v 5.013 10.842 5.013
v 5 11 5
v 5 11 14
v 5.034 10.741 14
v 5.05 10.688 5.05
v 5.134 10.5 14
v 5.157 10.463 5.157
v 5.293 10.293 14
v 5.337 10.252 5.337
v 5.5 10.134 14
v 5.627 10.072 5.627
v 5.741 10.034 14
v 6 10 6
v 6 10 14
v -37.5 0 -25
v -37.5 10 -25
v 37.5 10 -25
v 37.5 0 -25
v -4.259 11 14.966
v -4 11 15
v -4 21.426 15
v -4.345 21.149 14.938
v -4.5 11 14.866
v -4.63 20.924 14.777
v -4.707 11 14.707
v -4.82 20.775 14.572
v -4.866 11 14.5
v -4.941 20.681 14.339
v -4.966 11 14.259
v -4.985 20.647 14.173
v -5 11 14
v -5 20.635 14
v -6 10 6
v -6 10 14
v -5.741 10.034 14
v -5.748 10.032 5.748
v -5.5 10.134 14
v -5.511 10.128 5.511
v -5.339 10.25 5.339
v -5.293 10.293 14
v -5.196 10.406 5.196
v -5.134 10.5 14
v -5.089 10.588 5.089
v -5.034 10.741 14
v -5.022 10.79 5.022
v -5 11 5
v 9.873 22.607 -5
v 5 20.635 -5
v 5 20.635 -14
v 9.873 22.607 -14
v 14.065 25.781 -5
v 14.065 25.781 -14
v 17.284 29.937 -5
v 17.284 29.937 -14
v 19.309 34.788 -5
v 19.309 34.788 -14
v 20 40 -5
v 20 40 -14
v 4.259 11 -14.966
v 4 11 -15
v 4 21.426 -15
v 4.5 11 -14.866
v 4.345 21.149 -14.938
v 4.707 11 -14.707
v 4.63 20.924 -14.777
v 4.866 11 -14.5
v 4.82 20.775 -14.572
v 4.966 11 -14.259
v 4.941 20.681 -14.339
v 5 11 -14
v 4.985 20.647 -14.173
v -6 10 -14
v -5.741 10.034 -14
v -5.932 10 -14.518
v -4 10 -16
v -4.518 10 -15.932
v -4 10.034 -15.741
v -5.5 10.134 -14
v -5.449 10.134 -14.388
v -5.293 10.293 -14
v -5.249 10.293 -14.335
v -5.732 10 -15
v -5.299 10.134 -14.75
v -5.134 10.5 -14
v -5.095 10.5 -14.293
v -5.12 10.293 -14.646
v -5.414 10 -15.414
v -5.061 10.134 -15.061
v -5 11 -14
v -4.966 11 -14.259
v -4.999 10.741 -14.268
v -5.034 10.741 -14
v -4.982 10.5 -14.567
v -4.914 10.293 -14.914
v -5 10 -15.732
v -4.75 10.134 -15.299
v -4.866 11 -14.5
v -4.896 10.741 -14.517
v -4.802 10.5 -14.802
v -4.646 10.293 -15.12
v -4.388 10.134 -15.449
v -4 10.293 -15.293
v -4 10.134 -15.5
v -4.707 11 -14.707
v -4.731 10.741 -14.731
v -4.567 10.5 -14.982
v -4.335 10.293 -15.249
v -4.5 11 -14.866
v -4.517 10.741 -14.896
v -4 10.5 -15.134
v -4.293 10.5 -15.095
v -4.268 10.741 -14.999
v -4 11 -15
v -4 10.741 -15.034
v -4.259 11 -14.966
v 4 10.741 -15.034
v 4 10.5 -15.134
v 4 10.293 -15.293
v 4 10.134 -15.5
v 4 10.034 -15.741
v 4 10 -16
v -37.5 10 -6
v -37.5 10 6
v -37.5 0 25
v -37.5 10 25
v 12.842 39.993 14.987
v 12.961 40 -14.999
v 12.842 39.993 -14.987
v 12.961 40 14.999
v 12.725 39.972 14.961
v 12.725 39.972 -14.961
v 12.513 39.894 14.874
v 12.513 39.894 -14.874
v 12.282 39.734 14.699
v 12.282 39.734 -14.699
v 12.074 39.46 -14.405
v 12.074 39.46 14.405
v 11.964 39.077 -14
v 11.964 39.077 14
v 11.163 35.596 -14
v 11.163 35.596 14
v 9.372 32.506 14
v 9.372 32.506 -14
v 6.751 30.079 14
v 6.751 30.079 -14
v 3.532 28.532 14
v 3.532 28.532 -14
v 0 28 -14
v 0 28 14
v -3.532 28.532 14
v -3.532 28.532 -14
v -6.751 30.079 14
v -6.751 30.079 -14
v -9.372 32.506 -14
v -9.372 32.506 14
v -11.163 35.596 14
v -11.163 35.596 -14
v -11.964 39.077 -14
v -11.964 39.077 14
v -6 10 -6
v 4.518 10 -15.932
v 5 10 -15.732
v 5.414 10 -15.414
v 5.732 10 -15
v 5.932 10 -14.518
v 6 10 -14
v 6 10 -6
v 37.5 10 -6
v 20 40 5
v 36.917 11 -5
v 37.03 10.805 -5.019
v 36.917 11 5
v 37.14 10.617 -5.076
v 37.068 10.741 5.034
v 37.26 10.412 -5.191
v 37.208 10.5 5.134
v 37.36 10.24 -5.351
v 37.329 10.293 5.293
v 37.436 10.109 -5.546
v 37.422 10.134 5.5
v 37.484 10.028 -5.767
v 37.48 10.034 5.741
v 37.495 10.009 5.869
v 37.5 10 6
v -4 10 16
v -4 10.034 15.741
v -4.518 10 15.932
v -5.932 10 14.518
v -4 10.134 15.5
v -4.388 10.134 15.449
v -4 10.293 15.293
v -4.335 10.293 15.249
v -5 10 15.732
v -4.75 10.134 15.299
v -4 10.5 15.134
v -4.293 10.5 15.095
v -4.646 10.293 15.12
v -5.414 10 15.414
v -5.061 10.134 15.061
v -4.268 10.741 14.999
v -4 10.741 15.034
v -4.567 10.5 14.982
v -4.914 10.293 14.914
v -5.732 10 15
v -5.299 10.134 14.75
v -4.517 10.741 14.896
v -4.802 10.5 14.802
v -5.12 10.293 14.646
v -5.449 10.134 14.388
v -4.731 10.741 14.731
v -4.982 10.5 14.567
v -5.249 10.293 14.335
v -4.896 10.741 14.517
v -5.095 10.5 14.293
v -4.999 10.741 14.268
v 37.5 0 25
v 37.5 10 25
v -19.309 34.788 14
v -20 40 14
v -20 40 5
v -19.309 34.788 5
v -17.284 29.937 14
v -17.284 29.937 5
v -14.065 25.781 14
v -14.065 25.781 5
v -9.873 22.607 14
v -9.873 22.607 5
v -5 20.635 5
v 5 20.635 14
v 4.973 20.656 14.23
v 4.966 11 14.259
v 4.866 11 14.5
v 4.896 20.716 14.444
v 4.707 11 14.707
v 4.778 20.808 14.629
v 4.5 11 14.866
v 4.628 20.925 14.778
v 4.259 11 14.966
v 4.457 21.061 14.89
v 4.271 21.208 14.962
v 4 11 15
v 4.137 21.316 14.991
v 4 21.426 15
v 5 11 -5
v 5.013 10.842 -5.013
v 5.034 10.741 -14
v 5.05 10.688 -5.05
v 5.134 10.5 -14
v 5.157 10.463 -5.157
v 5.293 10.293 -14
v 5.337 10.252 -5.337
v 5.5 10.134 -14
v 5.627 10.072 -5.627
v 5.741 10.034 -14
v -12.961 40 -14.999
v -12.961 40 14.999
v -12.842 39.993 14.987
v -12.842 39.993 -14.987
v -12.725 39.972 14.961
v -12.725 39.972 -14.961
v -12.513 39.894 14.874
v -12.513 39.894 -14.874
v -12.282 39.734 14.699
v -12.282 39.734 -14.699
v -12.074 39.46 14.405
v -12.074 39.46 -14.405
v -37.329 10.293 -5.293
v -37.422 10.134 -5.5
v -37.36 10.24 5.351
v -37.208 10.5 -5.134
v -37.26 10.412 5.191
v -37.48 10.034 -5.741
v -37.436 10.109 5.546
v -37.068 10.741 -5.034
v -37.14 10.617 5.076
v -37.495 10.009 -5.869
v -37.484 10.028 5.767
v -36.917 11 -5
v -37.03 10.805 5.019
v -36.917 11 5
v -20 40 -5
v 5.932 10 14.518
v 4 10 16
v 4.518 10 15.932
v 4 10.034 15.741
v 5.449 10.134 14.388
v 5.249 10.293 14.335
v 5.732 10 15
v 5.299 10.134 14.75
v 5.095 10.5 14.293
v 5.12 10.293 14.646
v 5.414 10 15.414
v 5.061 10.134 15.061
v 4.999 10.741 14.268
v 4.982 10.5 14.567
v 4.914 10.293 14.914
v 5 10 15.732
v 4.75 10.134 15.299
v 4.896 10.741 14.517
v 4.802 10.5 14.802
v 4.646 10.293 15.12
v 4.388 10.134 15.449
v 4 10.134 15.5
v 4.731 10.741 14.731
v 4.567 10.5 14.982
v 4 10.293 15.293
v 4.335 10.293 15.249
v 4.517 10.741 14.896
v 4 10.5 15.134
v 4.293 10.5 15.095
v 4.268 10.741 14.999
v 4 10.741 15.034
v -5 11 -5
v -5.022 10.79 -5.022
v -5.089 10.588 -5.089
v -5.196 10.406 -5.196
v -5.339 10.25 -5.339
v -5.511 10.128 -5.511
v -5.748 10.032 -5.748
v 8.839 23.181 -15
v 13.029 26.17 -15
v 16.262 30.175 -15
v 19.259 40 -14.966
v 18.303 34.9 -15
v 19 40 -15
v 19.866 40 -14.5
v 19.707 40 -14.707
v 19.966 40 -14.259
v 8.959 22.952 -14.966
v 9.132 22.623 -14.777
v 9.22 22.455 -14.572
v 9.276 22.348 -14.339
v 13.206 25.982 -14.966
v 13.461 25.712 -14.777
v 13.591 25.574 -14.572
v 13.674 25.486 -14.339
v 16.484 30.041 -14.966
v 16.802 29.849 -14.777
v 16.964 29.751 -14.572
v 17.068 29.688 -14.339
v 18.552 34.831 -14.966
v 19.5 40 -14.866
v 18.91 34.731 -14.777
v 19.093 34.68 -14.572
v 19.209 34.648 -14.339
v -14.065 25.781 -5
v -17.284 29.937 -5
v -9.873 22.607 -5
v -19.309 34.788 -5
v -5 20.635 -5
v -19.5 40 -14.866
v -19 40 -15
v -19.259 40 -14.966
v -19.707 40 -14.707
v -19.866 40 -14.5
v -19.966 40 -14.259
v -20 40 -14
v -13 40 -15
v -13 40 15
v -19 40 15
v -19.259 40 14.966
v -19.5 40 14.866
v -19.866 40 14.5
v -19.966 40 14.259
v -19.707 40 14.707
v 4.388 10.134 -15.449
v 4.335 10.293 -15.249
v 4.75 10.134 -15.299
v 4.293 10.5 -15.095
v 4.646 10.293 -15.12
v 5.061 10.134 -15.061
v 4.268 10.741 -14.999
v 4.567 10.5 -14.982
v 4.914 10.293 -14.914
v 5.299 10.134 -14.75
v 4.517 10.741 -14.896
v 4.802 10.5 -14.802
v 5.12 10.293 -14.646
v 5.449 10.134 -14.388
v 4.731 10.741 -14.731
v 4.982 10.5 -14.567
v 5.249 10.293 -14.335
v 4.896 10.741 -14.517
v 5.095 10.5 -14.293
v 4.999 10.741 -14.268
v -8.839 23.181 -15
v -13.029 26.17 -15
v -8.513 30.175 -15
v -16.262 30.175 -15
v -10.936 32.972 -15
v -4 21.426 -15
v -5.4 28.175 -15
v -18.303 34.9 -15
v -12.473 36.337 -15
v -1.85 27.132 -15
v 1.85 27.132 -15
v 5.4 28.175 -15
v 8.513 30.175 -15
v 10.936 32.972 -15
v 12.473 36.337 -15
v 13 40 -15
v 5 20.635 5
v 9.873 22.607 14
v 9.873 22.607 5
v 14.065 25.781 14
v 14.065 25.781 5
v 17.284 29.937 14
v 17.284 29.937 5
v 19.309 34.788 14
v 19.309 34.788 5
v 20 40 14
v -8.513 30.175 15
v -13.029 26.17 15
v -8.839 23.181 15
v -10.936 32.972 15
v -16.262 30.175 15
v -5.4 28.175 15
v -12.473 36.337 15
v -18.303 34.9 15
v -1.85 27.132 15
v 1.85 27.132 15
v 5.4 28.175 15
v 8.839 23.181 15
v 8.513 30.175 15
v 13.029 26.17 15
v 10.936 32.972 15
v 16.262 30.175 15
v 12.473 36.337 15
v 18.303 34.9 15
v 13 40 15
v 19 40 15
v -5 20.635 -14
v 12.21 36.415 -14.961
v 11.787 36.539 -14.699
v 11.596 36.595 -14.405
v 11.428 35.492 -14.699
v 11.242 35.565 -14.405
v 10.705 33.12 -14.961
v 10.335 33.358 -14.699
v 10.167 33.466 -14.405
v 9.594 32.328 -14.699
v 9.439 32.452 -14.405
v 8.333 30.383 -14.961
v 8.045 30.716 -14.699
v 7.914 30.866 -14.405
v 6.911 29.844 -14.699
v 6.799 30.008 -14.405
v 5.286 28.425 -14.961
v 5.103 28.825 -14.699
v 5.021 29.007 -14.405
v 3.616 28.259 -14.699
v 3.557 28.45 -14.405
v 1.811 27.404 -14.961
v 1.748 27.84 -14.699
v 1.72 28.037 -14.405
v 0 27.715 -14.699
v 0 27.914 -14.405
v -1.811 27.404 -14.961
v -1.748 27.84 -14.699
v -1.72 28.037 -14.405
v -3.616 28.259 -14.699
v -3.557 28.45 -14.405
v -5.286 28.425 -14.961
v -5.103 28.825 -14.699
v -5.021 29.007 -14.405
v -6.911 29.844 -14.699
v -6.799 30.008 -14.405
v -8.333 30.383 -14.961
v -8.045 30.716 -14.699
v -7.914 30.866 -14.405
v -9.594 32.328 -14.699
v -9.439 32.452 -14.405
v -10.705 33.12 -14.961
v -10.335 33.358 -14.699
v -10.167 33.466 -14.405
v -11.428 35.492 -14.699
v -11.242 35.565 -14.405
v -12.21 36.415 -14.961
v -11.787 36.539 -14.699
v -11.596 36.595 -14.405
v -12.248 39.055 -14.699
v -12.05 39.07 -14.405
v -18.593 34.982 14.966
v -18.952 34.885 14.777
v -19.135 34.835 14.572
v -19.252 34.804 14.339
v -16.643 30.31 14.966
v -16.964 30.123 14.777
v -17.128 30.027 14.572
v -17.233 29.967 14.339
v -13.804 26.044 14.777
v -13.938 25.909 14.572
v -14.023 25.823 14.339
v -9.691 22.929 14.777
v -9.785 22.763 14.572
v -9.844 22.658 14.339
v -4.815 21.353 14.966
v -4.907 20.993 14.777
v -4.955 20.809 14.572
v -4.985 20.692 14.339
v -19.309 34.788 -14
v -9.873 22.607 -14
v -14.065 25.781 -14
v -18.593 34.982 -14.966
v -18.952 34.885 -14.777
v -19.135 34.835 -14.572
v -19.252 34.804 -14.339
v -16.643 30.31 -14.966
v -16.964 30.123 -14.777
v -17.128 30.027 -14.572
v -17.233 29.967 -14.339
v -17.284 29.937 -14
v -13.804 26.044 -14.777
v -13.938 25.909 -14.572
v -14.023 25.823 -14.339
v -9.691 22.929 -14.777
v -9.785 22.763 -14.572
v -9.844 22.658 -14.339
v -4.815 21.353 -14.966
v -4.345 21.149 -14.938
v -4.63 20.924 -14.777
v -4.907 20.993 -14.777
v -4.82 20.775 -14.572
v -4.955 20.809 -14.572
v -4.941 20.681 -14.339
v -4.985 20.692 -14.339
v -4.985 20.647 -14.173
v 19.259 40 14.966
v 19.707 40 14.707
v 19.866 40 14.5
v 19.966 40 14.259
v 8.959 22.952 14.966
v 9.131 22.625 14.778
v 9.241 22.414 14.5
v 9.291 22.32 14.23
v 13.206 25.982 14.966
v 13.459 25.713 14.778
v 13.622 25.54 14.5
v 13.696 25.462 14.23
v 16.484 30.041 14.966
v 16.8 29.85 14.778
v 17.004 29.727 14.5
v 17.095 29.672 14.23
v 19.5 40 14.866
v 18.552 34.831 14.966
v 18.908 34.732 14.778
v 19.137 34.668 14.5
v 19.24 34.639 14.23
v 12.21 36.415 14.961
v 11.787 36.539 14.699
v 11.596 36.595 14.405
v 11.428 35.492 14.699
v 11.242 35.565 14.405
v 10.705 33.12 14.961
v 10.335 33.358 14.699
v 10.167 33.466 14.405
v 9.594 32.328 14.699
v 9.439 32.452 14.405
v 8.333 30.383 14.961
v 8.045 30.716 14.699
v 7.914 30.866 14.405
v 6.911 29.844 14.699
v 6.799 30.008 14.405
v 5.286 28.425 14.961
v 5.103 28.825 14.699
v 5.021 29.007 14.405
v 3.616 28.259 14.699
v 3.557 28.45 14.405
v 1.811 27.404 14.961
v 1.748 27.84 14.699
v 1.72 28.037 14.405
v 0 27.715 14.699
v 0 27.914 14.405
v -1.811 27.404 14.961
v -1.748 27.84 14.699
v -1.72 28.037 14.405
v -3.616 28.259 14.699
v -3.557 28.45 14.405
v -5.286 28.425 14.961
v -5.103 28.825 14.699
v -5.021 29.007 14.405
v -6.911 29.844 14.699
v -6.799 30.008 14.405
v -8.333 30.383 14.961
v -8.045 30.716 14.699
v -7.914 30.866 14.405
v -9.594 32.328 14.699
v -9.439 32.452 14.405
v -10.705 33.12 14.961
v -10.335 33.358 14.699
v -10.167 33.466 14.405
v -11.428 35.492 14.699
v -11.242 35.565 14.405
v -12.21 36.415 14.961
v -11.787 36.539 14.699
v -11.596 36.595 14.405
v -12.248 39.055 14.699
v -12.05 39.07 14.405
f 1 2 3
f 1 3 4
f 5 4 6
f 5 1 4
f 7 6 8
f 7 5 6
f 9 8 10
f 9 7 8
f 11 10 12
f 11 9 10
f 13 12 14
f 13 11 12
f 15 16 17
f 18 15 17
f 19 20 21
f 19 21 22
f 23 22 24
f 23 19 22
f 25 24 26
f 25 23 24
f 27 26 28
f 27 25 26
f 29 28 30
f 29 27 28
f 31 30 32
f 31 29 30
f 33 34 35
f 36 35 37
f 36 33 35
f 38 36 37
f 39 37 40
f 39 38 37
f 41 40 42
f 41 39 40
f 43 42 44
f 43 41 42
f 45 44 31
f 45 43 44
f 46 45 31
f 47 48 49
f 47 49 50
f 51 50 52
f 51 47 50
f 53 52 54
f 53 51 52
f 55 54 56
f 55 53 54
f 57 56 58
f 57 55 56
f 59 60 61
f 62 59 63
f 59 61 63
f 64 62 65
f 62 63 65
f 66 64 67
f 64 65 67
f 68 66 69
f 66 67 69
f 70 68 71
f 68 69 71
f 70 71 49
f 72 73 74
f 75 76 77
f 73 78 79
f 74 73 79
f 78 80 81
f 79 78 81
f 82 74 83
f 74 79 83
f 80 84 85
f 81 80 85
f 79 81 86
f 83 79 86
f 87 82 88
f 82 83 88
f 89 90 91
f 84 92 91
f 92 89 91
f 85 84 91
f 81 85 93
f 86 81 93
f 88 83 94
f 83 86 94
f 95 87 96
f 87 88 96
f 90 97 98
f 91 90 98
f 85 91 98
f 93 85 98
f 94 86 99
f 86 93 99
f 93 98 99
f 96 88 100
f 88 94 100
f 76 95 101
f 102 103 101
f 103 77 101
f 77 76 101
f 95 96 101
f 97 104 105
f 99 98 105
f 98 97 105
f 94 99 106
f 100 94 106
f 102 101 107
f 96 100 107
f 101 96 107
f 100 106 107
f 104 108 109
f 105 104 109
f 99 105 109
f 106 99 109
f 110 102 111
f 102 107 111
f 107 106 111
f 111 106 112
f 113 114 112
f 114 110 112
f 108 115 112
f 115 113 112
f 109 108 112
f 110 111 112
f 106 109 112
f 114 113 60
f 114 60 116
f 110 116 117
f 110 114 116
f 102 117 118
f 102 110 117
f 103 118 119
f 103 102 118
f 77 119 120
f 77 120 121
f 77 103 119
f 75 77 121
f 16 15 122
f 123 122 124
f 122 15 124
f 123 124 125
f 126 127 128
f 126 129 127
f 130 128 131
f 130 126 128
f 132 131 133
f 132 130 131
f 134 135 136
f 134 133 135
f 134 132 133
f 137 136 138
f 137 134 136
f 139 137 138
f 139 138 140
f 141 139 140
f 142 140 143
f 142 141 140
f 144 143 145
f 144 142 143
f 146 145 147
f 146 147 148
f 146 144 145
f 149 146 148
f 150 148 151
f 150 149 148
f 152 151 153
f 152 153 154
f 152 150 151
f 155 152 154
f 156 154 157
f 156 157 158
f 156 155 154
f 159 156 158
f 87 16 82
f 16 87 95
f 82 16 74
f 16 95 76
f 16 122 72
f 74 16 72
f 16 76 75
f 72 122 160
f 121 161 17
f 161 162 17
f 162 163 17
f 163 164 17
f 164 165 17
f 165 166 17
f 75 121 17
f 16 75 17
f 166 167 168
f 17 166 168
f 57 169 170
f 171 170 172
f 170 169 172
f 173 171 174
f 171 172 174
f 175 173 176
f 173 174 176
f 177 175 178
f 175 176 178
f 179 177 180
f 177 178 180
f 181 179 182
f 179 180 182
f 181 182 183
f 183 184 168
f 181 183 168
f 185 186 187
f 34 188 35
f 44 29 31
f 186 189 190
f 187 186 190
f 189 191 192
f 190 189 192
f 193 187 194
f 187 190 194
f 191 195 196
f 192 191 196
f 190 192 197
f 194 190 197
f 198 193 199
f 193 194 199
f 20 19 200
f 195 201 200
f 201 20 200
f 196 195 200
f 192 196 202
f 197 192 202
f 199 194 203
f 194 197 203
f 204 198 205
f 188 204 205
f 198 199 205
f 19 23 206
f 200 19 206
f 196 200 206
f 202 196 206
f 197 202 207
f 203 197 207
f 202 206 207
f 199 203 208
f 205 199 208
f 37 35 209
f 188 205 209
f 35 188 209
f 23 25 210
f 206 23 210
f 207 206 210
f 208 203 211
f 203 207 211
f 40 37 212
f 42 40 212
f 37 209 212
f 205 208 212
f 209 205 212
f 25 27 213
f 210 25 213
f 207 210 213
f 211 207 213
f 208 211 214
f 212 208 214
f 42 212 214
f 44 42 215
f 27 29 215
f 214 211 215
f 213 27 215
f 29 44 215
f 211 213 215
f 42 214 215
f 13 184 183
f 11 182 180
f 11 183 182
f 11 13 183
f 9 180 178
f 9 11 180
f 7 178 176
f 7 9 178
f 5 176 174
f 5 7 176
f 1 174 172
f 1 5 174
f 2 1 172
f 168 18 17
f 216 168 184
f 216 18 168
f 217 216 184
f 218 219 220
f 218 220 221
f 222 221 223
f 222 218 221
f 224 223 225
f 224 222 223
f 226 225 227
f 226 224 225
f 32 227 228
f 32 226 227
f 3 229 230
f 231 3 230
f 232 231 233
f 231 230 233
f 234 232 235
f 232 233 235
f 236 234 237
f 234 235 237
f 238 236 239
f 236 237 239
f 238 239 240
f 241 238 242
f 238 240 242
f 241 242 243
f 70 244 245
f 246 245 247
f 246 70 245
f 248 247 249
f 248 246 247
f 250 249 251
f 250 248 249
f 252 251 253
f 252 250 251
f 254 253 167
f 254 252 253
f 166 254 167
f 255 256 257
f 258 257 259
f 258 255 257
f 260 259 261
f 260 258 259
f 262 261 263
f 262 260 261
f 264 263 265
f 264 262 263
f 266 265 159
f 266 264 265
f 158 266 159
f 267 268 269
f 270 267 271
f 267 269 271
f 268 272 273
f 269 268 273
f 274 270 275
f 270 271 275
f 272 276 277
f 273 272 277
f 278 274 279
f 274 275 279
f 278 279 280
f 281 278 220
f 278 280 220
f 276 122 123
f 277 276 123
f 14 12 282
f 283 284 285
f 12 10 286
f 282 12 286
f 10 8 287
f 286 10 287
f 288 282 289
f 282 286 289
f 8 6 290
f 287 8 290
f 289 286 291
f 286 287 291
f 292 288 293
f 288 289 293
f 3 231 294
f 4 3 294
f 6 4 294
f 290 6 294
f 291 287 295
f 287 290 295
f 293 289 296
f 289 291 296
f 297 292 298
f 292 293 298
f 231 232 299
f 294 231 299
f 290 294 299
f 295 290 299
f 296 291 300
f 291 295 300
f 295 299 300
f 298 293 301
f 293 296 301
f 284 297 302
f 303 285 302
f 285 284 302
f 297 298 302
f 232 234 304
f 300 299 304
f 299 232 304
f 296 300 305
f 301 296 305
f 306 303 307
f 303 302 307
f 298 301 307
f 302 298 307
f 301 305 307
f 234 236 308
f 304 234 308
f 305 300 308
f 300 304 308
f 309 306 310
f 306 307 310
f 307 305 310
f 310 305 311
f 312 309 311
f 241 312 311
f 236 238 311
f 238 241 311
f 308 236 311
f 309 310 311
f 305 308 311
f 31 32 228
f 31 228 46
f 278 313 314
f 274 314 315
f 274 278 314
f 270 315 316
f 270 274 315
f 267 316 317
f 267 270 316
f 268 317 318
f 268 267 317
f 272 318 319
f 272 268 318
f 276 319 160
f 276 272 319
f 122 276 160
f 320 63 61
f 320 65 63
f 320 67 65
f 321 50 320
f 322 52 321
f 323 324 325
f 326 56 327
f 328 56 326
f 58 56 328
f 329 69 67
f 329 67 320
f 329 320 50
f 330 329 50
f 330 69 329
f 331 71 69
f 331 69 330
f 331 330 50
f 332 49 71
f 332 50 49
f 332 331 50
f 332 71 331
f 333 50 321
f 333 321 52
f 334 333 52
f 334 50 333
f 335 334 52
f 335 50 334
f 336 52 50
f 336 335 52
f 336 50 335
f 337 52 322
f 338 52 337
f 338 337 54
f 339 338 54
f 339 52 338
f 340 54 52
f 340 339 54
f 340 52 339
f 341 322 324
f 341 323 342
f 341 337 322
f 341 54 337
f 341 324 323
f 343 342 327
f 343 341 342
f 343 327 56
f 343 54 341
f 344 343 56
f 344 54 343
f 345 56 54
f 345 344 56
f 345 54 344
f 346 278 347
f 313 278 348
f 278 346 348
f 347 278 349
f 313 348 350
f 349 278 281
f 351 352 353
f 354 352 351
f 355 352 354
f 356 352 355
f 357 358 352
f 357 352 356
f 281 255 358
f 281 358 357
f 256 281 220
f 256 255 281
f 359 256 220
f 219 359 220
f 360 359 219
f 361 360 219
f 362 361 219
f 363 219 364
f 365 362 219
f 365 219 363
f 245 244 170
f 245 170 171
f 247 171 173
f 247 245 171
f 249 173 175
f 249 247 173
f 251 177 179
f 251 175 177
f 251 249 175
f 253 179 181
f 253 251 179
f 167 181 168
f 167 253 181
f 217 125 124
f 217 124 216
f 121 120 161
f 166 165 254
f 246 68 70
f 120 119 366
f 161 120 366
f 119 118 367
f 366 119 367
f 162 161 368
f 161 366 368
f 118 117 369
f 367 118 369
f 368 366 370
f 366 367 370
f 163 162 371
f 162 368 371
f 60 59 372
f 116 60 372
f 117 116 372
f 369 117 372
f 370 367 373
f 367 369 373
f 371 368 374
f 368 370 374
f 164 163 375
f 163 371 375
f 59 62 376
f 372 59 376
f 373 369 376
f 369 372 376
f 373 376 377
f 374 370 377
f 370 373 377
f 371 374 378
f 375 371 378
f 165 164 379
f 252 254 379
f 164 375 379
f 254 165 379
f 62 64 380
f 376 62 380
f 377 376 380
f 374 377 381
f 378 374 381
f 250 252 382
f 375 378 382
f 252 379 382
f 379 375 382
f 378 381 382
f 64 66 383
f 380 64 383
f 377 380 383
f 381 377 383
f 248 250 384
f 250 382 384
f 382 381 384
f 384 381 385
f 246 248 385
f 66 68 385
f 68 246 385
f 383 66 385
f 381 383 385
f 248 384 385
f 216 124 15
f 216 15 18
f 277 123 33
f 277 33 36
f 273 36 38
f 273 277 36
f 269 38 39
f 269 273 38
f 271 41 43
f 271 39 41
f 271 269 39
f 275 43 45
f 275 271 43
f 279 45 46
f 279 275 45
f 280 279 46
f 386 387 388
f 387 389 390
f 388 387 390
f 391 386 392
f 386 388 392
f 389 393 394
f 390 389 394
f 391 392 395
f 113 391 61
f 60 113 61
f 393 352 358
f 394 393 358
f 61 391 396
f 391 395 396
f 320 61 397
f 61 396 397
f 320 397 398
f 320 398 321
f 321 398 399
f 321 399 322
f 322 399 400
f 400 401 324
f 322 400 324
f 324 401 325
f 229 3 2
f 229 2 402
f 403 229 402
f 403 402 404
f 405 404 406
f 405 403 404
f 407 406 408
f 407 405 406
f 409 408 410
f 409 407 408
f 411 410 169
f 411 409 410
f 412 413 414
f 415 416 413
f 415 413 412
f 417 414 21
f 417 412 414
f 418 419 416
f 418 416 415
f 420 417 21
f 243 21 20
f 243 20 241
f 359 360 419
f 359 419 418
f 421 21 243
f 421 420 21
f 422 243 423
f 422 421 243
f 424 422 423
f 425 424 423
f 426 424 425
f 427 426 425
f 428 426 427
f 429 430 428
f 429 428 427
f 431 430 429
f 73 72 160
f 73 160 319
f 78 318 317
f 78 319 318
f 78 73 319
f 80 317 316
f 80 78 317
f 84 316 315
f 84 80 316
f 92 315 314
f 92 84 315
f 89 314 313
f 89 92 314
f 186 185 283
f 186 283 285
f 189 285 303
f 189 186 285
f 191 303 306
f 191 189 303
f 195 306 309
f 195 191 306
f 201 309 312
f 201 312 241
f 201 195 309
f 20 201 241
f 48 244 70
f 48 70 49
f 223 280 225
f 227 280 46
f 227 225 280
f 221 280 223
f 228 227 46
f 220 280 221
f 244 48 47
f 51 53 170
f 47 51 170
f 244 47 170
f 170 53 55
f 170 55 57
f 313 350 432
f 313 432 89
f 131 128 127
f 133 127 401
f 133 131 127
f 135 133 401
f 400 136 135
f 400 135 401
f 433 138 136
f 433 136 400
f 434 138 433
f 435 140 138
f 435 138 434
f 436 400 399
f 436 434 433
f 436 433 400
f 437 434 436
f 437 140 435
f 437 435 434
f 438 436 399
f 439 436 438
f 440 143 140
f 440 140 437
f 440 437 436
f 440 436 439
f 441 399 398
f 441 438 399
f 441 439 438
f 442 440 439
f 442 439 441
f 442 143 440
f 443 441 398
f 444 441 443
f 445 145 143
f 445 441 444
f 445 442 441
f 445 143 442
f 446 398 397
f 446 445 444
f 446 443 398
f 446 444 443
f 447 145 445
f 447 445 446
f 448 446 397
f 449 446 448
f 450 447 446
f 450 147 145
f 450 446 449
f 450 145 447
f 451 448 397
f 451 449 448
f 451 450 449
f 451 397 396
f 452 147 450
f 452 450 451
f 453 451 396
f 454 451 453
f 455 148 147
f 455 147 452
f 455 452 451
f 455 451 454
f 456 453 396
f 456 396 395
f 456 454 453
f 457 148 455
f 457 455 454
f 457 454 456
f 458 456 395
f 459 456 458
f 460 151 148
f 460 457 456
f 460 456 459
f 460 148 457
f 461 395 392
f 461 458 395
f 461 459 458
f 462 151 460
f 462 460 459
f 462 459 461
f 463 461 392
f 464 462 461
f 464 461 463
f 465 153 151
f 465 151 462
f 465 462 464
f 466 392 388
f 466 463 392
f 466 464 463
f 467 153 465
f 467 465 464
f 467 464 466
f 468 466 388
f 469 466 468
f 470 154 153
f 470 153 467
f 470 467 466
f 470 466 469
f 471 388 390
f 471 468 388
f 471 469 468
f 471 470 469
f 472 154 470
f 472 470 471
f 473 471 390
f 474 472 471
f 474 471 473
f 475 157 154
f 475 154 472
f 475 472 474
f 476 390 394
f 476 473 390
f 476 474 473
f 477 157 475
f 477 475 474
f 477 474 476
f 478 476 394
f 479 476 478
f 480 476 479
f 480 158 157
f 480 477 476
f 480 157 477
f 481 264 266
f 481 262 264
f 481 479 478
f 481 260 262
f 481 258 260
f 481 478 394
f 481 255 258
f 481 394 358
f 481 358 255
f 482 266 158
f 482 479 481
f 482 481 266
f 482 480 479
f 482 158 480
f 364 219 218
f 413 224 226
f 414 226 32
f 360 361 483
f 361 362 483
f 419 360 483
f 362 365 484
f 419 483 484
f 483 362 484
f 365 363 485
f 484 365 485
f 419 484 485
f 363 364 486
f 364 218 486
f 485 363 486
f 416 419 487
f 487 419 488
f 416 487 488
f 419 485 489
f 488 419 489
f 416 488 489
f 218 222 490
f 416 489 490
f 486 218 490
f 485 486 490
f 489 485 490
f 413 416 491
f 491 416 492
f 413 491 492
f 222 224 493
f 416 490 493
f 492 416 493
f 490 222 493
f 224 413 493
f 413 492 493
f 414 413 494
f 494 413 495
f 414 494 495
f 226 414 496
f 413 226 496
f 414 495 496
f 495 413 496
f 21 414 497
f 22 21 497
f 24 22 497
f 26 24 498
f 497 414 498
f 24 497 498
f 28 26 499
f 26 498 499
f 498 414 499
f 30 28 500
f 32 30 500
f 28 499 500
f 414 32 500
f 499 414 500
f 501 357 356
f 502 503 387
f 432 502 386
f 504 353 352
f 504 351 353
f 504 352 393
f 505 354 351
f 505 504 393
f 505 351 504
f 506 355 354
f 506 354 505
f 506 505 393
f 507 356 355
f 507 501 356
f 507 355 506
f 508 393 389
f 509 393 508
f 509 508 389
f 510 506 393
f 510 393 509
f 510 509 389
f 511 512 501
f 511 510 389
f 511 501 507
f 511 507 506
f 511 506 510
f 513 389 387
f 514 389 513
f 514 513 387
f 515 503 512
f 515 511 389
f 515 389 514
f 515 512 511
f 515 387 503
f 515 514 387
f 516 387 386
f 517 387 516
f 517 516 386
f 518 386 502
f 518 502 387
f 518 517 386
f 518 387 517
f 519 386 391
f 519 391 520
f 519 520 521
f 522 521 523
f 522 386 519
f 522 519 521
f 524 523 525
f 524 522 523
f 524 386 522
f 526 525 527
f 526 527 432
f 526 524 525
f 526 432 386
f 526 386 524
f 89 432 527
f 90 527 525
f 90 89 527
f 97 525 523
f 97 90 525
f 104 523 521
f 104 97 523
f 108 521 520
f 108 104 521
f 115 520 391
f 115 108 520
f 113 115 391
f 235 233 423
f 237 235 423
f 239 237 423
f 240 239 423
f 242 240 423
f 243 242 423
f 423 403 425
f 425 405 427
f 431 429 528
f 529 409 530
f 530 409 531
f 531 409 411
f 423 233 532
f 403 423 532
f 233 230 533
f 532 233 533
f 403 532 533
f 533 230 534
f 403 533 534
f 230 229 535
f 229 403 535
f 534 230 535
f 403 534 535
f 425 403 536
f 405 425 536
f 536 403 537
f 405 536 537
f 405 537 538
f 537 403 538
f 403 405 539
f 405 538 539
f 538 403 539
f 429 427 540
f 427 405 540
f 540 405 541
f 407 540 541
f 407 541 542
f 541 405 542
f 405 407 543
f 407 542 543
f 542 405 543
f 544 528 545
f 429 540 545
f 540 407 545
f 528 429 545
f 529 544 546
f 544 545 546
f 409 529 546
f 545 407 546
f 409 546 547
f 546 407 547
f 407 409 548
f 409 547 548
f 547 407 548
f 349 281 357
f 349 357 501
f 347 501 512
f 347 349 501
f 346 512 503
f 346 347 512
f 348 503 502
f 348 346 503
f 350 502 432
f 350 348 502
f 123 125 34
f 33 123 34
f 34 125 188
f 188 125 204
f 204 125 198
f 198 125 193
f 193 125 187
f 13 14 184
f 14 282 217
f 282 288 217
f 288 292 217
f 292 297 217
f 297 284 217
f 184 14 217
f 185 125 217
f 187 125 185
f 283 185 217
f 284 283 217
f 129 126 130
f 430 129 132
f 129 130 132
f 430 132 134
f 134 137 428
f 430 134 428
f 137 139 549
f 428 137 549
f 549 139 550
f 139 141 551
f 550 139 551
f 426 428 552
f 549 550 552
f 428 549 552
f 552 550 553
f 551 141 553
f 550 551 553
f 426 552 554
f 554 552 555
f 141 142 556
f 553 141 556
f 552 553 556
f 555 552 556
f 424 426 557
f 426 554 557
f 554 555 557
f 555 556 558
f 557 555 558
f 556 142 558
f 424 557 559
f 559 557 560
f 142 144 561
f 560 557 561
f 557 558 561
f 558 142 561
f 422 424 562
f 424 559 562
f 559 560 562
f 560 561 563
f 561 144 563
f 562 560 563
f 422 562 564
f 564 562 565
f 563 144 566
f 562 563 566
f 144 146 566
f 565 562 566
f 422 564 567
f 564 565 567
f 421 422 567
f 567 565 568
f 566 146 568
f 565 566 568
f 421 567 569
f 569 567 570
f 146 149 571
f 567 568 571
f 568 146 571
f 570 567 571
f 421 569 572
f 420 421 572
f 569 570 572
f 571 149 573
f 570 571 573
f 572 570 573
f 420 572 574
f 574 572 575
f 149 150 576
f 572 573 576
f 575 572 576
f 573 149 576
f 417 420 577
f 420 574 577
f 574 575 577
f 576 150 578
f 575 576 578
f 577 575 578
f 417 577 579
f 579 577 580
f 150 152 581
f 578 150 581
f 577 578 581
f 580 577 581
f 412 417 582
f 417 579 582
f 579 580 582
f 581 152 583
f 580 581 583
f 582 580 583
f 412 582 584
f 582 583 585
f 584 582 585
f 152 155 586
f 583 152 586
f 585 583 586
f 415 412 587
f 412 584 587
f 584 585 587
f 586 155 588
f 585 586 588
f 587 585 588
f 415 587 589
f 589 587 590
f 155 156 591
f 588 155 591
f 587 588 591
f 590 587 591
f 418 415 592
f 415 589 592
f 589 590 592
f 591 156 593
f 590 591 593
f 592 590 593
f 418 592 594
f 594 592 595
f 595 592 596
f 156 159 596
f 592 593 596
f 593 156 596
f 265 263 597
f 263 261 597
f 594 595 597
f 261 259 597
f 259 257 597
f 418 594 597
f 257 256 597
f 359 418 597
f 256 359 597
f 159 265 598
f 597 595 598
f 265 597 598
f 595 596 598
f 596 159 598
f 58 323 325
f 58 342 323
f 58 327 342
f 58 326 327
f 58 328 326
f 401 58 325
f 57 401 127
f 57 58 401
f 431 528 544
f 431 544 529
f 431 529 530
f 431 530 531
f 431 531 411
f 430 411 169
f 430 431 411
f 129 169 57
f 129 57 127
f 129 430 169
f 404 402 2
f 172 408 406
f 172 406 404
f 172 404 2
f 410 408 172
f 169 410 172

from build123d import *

# Parameters (mm, degrees)
SKETCH1_W           = 75
SKETCH1_H           = 10
BOSS_EXTRUDE5_DEPTH = 25
BOSS_EXTRUDE6_DEPTH = 15
BOSS_EXTRUDE7_DEPTH = 5
FILLET2_R           = 1
FILLET3_R           = 1


with BuildPart() as part:
    # Sketch1 → Boss-Extrude5 (new, symmetric)
    with BuildSketch(Plane.XY):
        with Locations((0, 5)):
            Rectangle(SKETCH1_W, SKETCH1_H)
    extrude(amount=BOSS_EXTRUDE5_DEPTH, both=True)

    # Sketch1<9> → Boss-Extrude6 (add, symmetric)
    with BuildSketch(Plane.XY):
        with BuildLine():
            Line((-5, 20.635083269), (-5, 10))
            Line((-5, 10), (5, 10))
            Line((5, 10), (5, 20.635083269))
            ThreePointArc((5, 20.635083269), (15.811388301, 27.752551286), (20, 40))
            Line((20, 40), (12, 40))
            ThreePointArc((12, 40), (0, 28), (-12, 40))
            Line((-12, 40), (-20, 40))
            ThreePointArc((-20, 40), (-15.811388301, 27.752551286), (-5, 20.635083269))
        make_face()
    extrude(amount=BOSS_EXTRUDE6_DEPTH, both=True)

    # Sketch1<10> → Boss-Extrude7 (add, symmetric)
    with BuildSketch(Plane.XY):
        with BuildLine():
            Line((5, 10), (37.5, 10))
            Line((37.5, 10), (20, 40))
            ThreePointArc((20, 40), (15.811388301, 27.752551286), (5, 20.635083269))
            Line((5, 20.635083269), (5, 10))
        make_face()
        with BuildLine():
            Line((-20, 40), (-37.5, 10))
            Line((-37.5, 10), (-5, 10))
            Line((-5, 10), (-5, 20.635083269))
            ThreePointArc((-5, 20.635083269), (-15.811388301, 27.752551286), (-20, 40))
        make_face()
    extrude(amount=BOSS_EXTRUDE7_DEPTH, both=True)

    # Fillet2
    fillet2_edges = [part.edges().sort_by_distance(p)[0] for p in [
        (-12, 40, 0),
        (-15.811388301, 27.752551286, -15),
        (-5, 15.317541634, -15),
        (5, 15.317541634, 15),
        (15.811388301, 27.752551286, -15),
        (0, 28, 15),
        (12, 40, 0),
        (-15.811388301, 27.752551286, 15),
        (-5, 15.317541634, 15),
        (15.811388301, 27.752551286, 15),
        (0, 28, -15),
        (5, 15.317541634, -15),
    ]]
    fillet(fillet2_edges, radius=FILLET2_R)

    # Fillet3
    # the kernel refuses this fillet: 1 mm, written as the material it adds along each edge
    with BuildSketch(Plane(origin=(5, 10, -14), x_dir=(1, 0, 0), z_dir=(0, 0, 1)), Plane(origin=(5, 10, 2.5), x_dir=(1, 0, 0), z_dir=(0, 0, 1))) as fillet3_piece_1:
        with BuildLine():
            CenterArc((FILLET3_R, FILLET3_R), FILLET3_R, 180, 90)
            Line((0, FILLET3_R), (0, 0))
            Line((0, 0), (FILLET3_R, 0))
        make_face()
    extrude(amount=11.5)
    with BuildSketch(Plane(origin=(-5, 10, -14), x_dir=(-1, 0, 0), z_dir=(0, 0, 1)), Plane(origin=(-5, 10, 2.5), x_dir=(-1, 0, 0), z_dir=(0, 0, 1))) as fillet3_piece_2:
        with BuildLine():
            CenterArc((FILLET3_R, -FILLET3_R), FILLET3_R, 90, 90)
            Line((0, -FILLET3_R), (0, 0))
            Line((0, 0), (FILLET3_R, 0))
        make_face()
    extrude(amount=11.5)
    with BuildSketch(Plane(origin=(2.5, 10, 5), x_dir=(0, 0, 1), z_dir=(1, 0, 0))) as fillet3_piece_3_section:
        with BuildLine():
            CenterArc((FILLET3_R, -FILLET3_R), FILLET3_R, 90, 90)
            Line((0, -FILLET3_R), (0, 0))
            Line((0, 0), (FILLET3_R, 0))
        make_face()
    fillet3_piece_3 = extrude(amount=35, mode=Mode.PRIVATE)
    fillet3_piece_3 = split(fillet3_piece_3, bisect_by=Plane(origin=(28.832812489, 24.858035733, 5.226395114), z_dir=(-0.8637789008984333, -0.5038710255240864, 0)), keep=Keep.TOP, mode=Mode.PRIVATE)
    add(fillet3_piece_3)
    with BuildSketch(Plane(origin=(2.5, 10, -5), x_dir=(0, 0, -1), z_dir=(1, 0, 0))) as fillet3_piece_4_section:
        with BuildLine():
            CenterArc((FILLET3_R, FILLET3_R), FILLET3_R, 180, 90)
            Line((0, FILLET3_R), (0, 0))
            Line((0, 0), (FILLET3_R, 0))
        make_face()
    fillet3_piece_4 = extrude(amount=35, mode=Mode.PRIVATE)
    fillet3_piece_4 = split(fillet3_piece_4, bisect_by=Plane(origin=(28.832812489, 24.858035733, -5.226395114), z_dir=(-0.8637789008984333, -0.5038710255240864, 0)), keep=Keep.TOP, mode=Mode.PRIVATE)
    add(fillet3_piece_4)
    with BuildSketch(Plane(origin=(-37.5, 10, 5), x_dir=(0, 0, 1), z_dir=(1, 0, 0))) as fillet3_piece_5_section:
        with BuildLine():
            CenterArc((FILLET3_R, -FILLET3_R), FILLET3_R, 90, 90)
            Line((0, -FILLET3_R), (0, 0))
            Line((0, 0), (FILLET3_R, 0))
        make_face()
    fillet3_piece_5 = extrude(amount=35, mode=Mode.PRIVATE)
    fillet3_piece_5 = split(fillet3_piece_5, bisect_by=Plane(origin=(-33.259418432, 17.269568402, 5.226886144), z_dir=(0.8637789008984326, -0.5038710255240878, 0)), keep=Keep.TOP, mode=Mode.PRIVATE)
    add(fillet3_piece_5)
    with BuildSketch(Plane(origin=(-37.5, 10, -5), x_dir=(0, 0, -1), z_dir=(1, 0, 0))) as fillet3_piece_6_section:
        with BuildLine():
            CenterArc((FILLET3_R, FILLET3_R), FILLET3_R, 180, 90)
            Line((0, FILLET3_R), (0, 0))
            Line((0, 0), (FILLET3_R, 0))
        make_face()
    fillet3_piece_6 = extrude(amount=35, mode=Mode.PRIVATE)
    fillet3_piece_6 = split(fillet3_piece_6, bisect_by=Plane(origin=(-33.259418432, 17.269568402, -5.226886144), z_dir=(0.8637789008984326, -0.5038710255240878, 0)), keep=Keep.TOP, mode=Mode.PRIVATE)
    add(fillet3_piece_6)
    with BuildSketch(Plane(origin=(-4, 10, 15), x_dir=(0, 0, 1), z_dir=(1, 0, 0))) as fillet3_piece_7:
        with BuildLine():
            CenterArc((FILLET3_R, -FILLET3_R), FILLET3_R, 90, 90)
            Line((0, -FILLET3_R), (0, 0))
            Line((0, 0), (FILLET3_R, 0))
        make_face()
    extrude(amount=8)
    with BuildSketch(Plane(origin=(-4, 10, -15), x_dir=(0, 0, -1), z_dir=(1, 0, 0))) as fillet3_piece_8:
        with BuildLine():
            CenterArc((FILLET3_R, FILLET3_R), FILLET3_R, 180, 90)
            Line((0, FILLET3_R), (0, 0))
            Line((0, 0), (FILLET3_R, 0))
        make_face()
    extrude(amount=8)
    with BuildSketch(Plane(origin=(-4, 10, 14), x_dir=(0, 0, 1), z_dir=(1, 0, 0))) as fillet3_piece_9:
        with BuildLine():
            CenterArc((1 + FILLET3_R, -FILLET3_R), FILLET3_R, 90, 90)
            Line((1, -FILLET3_R), (1, 0))
            Line((1, 0), (1 + FILLET3_R, 0))
        make_face()
    revolve(axis=Axis((-4, 10, 14), (0, -1, 0)), revolution_arc=90)
    with BuildSketch(Plane(origin=(4, 10, 14), x_dir=(1, 0, 0), z_dir=(0, 0, -1))) as fillet3_piece_10:
        with BuildLine():
            CenterArc((1 + FILLET3_R, -FILLET3_R), FILLET3_R, 90, 90)
            Line((1, -FILLET3_R), (1, 0))
            Line((1, 0), (1 + FILLET3_R, 0))
        make_face()
    revolve(axis=Axis((4, 10, 14), (0, -1, 0)), revolution_arc=90)
    with BuildSketch(Plane(origin=(4, 10, -14), x_dir=(0, 0, -1), z_dir=(-1, 0, 0))) as fillet3_piece_11:
        with BuildLine():
            CenterArc((1 + FILLET3_R, -FILLET3_R), FILLET3_R, 90, 90)
            Line((1, -FILLET3_R), (1, 0))
            Line((1, 0), (1 + FILLET3_R, 0))
        make_face()
    revolve(axis=Axis((4, 10, -14), (0, -1, 0)), revolution_arc=90)
    with BuildSketch(Plane(origin=(-4, 10, -14), x_dir=(-1, 0, 0), z_dir=(0, 0, 1))) as fillet3_piece_12:
        with BuildLine():
            CenterArc((1 + FILLET3_R, -FILLET3_R), FILLET3_R, 90, 90)
            Line((1, -FILLET3_R), (1, 0))
            Line((1, 0), (1 + FILLET3_R, 0))
        make_face()
    revolve(axis=Axis((-4, 10, -14), (0, -1, 0)), revolution_arc=90)


solid = part.part
